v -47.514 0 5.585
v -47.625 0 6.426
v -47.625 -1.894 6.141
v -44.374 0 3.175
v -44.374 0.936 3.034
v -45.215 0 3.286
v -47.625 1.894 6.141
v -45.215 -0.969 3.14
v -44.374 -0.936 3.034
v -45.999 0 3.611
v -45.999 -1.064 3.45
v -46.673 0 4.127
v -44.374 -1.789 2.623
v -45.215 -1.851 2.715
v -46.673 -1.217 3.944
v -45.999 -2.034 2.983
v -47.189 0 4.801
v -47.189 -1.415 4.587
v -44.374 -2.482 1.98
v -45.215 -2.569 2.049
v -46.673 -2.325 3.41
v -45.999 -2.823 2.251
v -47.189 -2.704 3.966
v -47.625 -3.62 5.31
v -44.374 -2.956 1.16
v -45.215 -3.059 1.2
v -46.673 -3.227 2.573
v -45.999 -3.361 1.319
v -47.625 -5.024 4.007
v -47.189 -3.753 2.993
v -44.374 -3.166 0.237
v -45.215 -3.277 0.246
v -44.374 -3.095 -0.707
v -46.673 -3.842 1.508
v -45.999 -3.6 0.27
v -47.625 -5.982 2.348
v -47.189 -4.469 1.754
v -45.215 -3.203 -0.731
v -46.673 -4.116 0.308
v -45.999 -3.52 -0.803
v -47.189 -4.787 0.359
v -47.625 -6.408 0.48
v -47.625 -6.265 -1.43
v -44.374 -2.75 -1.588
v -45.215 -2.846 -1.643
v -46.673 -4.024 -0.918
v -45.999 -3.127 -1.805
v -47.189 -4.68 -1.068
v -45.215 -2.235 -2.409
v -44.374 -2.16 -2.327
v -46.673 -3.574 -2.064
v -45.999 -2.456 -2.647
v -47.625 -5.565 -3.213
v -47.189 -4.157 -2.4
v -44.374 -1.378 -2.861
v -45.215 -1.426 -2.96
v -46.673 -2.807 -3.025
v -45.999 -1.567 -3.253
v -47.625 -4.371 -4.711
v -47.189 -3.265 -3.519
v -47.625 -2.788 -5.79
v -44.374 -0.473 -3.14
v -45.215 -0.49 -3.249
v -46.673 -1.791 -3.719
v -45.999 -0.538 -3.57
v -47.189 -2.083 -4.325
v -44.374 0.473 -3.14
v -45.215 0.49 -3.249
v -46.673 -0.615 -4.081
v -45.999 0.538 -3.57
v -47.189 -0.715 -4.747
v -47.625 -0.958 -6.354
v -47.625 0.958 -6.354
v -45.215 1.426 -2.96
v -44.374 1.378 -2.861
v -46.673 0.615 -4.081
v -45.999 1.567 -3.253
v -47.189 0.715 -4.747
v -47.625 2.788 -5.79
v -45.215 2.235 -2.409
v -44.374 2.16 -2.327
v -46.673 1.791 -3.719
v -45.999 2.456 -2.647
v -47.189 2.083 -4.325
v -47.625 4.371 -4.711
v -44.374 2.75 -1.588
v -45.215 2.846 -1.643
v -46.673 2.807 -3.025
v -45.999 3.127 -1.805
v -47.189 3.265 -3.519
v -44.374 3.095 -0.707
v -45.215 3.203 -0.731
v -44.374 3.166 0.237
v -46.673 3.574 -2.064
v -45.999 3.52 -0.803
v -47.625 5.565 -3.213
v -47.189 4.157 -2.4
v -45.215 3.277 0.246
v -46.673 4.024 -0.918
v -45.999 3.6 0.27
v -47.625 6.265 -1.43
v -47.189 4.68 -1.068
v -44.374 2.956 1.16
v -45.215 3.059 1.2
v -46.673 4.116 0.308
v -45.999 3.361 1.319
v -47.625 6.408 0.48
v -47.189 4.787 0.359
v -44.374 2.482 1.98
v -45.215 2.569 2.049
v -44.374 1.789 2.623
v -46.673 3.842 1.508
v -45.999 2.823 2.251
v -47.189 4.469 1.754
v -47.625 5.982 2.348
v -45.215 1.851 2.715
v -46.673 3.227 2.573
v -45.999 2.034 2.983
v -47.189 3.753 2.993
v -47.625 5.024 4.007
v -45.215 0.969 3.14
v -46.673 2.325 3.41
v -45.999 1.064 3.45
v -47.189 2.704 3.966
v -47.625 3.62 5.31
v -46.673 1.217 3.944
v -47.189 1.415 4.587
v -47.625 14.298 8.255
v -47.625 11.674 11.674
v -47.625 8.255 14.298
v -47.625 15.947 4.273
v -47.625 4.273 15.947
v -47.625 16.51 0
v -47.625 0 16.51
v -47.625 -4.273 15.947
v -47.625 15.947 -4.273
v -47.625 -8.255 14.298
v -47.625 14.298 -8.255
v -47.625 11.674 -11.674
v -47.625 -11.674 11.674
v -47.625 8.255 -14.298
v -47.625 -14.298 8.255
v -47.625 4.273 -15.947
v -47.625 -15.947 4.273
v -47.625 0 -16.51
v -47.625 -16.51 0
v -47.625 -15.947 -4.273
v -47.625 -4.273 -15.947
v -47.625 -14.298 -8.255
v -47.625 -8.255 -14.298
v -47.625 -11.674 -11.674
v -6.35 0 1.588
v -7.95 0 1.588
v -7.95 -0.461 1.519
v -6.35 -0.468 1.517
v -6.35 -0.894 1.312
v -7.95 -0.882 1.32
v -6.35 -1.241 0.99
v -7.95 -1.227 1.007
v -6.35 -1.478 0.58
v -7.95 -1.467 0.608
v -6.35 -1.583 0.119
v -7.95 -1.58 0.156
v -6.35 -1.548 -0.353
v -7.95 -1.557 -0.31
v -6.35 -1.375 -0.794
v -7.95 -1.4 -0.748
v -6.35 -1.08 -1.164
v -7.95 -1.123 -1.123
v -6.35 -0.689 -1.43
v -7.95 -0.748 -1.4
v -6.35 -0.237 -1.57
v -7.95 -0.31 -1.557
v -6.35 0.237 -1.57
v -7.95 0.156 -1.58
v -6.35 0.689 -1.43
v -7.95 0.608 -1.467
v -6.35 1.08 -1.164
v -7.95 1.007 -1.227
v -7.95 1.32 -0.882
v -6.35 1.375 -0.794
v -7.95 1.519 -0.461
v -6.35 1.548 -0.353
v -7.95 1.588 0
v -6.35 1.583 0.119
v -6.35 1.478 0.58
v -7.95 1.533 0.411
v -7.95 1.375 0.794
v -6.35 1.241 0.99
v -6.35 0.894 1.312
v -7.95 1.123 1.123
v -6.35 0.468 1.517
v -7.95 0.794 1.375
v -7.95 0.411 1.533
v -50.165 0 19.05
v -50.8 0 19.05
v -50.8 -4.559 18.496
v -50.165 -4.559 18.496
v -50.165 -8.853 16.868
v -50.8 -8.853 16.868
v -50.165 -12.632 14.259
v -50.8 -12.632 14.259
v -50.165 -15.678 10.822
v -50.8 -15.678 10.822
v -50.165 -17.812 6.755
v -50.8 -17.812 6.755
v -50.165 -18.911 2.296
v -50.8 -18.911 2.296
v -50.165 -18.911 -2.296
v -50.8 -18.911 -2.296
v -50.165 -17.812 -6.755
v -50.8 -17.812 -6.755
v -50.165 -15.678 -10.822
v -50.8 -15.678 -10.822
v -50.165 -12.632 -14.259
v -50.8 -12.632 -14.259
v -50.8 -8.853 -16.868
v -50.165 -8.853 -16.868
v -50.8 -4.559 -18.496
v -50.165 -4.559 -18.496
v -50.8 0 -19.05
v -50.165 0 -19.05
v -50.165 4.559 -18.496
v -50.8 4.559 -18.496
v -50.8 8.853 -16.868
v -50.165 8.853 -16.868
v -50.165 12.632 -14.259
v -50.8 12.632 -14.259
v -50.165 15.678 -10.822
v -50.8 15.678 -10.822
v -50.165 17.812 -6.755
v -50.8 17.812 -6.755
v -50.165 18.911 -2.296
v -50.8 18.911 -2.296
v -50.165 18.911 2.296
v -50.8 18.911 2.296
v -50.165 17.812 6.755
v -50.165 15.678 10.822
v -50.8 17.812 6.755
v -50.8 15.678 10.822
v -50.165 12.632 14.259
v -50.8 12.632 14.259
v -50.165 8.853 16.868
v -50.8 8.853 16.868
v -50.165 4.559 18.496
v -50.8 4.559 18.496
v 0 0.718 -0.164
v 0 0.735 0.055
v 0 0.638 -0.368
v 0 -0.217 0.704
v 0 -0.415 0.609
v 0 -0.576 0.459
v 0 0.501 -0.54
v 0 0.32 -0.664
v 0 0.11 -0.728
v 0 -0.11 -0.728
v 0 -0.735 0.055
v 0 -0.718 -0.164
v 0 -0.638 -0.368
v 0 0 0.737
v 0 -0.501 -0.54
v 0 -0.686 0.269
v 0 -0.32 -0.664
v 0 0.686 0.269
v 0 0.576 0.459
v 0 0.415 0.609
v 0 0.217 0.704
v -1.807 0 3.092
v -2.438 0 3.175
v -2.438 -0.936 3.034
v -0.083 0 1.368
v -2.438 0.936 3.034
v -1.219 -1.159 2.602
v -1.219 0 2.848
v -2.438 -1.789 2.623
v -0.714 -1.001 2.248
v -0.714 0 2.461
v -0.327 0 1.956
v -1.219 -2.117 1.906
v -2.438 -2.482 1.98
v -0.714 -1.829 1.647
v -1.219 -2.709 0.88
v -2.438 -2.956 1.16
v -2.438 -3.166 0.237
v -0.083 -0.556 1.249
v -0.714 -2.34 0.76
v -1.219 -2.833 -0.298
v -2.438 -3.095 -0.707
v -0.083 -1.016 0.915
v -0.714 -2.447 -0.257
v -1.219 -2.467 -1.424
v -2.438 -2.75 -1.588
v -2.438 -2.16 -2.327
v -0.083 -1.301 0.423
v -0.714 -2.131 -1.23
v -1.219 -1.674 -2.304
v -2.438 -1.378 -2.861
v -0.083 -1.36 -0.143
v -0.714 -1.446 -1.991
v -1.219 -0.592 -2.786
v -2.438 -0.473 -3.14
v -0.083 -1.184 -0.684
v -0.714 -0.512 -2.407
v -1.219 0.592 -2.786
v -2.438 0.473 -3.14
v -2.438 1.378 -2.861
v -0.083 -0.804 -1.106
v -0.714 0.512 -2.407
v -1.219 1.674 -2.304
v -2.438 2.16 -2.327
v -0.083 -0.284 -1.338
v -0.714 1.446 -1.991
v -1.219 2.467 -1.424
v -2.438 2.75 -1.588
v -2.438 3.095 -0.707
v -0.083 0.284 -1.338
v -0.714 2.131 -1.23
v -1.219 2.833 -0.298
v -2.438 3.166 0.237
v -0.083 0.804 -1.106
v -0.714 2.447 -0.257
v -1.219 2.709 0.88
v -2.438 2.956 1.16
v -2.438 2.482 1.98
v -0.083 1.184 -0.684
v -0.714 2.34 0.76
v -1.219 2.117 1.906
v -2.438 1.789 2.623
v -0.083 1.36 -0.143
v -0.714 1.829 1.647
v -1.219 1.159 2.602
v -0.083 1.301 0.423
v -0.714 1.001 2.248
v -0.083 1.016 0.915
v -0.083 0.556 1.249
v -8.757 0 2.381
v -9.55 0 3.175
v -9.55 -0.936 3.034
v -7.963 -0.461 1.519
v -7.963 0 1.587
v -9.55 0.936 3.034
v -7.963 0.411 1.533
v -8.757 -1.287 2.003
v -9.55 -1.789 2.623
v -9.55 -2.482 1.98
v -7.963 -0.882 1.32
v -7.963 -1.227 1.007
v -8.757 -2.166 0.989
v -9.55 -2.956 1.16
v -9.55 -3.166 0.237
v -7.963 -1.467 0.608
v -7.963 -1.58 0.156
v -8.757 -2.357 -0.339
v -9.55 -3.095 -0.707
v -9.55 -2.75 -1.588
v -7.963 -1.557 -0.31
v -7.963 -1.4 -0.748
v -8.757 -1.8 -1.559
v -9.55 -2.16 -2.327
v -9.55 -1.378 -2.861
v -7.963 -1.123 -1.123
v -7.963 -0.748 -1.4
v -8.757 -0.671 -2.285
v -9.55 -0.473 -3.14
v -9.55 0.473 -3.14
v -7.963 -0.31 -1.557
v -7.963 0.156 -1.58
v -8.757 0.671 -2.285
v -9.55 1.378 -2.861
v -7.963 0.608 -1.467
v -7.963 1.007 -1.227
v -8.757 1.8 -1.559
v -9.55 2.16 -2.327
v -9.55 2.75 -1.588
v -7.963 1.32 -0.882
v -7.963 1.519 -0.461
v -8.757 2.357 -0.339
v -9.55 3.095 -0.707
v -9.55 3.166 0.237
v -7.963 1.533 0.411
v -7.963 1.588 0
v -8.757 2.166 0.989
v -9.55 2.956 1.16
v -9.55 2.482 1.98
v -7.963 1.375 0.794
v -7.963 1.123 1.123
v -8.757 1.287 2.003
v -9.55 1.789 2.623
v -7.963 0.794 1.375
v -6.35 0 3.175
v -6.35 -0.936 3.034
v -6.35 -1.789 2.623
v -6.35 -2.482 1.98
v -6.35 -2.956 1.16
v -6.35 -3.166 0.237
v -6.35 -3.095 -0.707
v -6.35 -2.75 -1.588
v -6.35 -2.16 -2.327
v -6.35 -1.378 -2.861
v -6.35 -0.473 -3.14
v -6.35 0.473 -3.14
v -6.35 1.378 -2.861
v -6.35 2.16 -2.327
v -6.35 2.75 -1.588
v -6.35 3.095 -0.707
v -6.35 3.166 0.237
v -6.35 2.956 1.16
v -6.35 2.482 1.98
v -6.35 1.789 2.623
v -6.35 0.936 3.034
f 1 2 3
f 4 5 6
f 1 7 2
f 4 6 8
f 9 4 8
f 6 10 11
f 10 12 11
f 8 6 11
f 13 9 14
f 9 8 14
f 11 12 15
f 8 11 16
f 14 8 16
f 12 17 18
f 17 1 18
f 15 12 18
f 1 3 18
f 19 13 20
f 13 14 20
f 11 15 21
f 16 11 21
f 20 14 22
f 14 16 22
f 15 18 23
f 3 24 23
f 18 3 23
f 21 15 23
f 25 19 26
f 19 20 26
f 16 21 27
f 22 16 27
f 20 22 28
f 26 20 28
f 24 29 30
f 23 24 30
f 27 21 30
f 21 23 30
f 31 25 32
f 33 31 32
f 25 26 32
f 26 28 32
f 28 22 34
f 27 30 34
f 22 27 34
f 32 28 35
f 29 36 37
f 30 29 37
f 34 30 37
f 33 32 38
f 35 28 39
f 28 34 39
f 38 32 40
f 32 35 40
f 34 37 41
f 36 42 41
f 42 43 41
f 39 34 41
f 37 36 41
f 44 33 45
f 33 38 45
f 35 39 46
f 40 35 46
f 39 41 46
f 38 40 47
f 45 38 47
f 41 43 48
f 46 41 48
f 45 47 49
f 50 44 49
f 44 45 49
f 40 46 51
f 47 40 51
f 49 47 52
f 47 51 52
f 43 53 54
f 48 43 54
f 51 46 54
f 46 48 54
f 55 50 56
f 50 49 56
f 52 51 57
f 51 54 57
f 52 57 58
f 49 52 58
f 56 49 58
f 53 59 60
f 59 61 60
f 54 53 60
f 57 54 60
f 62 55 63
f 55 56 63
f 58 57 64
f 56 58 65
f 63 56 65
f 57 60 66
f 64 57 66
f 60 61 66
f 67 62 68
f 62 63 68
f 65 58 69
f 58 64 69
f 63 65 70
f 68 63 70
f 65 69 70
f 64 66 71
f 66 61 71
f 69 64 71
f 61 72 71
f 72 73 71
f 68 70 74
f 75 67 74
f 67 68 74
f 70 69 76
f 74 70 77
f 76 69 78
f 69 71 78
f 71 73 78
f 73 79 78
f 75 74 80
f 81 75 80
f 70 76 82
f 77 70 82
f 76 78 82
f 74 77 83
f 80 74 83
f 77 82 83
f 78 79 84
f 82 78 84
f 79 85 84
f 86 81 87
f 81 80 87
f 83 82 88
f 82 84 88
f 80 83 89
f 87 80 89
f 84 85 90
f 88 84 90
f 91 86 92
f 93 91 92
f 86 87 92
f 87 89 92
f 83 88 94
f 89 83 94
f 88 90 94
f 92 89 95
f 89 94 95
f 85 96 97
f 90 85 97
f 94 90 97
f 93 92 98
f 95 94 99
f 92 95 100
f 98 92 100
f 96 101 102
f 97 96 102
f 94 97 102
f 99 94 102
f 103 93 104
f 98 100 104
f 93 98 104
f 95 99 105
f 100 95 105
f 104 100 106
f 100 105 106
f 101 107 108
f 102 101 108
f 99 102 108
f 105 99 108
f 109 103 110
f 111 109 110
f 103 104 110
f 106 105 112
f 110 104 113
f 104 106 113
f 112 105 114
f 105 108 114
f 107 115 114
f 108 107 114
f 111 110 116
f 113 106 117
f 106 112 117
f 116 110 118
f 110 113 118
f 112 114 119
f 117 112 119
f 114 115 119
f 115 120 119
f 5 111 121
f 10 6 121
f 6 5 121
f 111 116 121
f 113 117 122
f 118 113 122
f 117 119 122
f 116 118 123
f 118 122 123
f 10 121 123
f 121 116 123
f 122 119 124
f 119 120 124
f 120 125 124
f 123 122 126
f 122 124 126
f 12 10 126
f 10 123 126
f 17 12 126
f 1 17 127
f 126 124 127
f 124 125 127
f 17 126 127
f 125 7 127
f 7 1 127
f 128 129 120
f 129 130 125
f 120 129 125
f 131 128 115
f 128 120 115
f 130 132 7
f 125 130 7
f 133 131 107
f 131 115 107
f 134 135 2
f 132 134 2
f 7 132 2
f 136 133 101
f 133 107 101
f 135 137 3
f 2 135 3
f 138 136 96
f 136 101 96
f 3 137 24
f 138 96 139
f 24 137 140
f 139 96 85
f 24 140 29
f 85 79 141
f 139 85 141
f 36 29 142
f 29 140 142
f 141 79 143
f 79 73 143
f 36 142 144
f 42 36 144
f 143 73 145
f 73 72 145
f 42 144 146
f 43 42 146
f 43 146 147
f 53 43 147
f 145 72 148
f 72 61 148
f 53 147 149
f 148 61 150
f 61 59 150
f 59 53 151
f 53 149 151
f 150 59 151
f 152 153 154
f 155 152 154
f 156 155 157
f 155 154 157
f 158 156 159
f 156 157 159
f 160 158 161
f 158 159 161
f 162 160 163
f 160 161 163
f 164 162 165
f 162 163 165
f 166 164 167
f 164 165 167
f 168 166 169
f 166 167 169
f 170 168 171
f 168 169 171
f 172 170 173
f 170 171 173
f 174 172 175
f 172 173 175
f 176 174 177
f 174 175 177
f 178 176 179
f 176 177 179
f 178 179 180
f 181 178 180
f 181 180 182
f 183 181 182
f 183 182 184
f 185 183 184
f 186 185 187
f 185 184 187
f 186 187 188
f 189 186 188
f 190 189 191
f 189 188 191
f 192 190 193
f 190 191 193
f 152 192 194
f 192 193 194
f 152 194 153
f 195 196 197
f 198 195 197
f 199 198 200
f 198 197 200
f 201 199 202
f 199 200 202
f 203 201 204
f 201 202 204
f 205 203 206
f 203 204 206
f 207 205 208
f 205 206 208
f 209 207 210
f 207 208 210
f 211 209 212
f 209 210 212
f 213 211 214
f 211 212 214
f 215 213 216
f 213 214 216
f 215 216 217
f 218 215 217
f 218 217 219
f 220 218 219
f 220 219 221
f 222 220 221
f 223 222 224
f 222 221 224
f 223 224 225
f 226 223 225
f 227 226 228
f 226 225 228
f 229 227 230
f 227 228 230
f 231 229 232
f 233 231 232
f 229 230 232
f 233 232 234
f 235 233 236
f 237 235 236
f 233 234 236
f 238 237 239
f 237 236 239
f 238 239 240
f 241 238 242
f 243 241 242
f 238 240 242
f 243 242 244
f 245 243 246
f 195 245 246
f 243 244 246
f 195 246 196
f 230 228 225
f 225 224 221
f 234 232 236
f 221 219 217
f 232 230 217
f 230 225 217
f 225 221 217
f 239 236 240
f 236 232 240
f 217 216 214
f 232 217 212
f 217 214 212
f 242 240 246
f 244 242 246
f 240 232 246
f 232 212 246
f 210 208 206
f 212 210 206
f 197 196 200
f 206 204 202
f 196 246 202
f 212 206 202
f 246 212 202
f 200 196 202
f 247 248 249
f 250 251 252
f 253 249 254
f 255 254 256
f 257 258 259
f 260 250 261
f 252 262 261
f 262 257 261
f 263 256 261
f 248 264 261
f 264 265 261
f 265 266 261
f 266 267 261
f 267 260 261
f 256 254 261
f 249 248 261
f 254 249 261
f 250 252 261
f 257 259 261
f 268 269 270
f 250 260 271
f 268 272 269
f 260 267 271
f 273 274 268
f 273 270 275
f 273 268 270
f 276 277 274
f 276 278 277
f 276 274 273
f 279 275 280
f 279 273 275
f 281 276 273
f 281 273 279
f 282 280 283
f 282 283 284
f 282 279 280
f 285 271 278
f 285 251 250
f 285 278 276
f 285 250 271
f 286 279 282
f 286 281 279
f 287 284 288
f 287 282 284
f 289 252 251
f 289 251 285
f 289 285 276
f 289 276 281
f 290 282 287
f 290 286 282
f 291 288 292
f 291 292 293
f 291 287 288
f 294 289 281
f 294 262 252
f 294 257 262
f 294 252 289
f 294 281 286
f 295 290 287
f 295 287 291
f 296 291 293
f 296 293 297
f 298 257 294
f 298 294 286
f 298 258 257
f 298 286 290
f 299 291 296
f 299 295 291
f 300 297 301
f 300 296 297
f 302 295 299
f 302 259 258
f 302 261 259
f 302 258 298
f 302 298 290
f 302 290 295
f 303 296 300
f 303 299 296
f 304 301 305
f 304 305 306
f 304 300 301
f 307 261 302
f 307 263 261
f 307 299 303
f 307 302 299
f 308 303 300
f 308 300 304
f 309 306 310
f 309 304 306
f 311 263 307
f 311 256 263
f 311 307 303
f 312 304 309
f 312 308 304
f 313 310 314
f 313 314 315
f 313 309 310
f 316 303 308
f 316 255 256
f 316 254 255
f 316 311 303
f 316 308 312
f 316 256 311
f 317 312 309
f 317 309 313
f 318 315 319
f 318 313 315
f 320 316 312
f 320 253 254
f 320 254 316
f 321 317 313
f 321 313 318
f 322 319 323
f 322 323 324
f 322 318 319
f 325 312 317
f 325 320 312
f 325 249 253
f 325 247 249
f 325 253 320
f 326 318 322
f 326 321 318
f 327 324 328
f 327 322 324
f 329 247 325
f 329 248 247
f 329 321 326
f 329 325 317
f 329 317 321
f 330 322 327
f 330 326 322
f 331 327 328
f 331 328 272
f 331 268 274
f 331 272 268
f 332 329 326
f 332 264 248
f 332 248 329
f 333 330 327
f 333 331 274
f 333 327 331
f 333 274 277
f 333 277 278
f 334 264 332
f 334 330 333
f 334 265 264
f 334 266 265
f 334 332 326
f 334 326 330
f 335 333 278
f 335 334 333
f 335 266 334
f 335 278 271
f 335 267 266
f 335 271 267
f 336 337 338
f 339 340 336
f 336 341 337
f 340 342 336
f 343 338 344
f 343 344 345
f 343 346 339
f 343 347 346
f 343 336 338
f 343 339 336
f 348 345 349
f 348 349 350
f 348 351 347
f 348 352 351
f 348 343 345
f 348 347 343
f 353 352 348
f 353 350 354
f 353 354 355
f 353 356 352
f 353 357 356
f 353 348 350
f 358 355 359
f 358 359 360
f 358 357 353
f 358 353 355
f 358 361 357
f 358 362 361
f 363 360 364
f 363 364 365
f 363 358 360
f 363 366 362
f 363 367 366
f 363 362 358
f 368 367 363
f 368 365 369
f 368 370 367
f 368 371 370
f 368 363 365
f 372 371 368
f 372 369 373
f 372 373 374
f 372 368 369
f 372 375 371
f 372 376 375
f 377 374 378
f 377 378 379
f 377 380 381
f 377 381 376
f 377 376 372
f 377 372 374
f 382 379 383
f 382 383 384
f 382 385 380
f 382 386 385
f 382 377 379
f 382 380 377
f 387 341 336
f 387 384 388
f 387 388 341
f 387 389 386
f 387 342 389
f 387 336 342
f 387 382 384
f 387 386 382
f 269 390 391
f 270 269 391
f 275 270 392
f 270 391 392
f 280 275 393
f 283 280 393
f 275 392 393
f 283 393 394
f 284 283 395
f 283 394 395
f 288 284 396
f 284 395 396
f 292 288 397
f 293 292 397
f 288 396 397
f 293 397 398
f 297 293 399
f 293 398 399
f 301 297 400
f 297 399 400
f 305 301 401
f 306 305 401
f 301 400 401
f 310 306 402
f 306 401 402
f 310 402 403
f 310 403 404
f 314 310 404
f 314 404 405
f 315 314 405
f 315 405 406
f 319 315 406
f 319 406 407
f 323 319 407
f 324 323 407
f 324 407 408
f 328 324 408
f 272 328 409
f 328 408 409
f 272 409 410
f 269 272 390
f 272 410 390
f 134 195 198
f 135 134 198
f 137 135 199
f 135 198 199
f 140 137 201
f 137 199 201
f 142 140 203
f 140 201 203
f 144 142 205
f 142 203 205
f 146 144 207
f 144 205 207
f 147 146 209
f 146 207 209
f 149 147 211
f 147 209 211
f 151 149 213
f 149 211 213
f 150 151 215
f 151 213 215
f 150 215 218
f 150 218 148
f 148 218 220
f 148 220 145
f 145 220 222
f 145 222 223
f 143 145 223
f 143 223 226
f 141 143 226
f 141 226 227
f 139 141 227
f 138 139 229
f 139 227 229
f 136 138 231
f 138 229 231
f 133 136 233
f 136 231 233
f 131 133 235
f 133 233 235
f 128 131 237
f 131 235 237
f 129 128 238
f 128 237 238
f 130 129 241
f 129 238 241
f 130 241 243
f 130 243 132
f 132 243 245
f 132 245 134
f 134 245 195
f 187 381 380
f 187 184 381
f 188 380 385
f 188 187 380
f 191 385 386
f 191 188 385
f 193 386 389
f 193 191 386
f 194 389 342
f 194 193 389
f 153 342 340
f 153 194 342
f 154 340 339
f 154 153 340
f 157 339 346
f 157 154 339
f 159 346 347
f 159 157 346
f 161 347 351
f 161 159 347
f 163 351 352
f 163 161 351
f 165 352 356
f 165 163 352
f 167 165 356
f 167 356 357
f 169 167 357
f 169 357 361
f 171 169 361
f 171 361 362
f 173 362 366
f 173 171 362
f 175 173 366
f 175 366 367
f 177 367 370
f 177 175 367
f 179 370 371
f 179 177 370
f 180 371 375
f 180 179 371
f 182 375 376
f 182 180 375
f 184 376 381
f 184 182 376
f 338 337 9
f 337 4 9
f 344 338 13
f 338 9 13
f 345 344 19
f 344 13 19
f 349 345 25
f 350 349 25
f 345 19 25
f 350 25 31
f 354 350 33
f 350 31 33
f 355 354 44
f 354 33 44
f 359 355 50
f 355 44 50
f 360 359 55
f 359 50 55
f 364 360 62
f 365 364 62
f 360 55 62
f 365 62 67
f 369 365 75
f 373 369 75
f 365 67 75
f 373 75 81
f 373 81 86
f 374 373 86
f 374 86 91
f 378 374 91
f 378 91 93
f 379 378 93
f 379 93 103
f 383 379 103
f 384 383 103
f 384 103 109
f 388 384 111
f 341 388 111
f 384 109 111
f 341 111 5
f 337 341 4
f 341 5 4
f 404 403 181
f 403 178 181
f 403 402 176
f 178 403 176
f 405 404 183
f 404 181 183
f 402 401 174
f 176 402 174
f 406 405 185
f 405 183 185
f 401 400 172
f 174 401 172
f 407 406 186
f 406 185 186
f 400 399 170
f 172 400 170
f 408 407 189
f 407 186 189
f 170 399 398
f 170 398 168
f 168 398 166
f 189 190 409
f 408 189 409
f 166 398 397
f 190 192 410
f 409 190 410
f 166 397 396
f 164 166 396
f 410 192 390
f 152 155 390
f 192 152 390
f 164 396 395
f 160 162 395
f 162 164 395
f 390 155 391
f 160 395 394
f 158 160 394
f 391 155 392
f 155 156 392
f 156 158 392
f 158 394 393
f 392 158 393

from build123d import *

# Parameters (mm, degrees)
F2_R        = 3.2512
F3_SIZE2    = 2.54
F3_SIZE     = 2.54
F4_S5_R     = 1.5875
F4_T6_DEPTH = 6
F5_R        = 2.4384


# Not quite as in the source:
# - a fillet or chamfer that OpenCascade refuses, or shapes differently, is made with other operations: its cross-section is extruded or revolved along the edge and cut away or added


with BuildPart() as f1:
    # F0 (on Front) → F1 (revolve)
    with BuildSketch(Plane.XZ):
        Polygon((-50.8, 0), (0, 0), (0, 3.175), (-6.35, 3.175), (-6.35, 1.5875), (-7.9502, 1.5875), (-7.9502, 3.175), (-47.625, 3.175), (-47.625, 19.05), (-50.8, 19.05), align=None)
    revolve(axis=Axis((-25.4, 0, 0), (1, 0, 0)))

    # F2
    f2_edges = [f1.edges().sort_by_distance(p)[0] for p in [
        (-47.625, 0, -3.175),
    ]]
    fillet(f2_edges, radius=F2_R)

    # F3
    f3_edges = [f1.edges().sort_by_distance(p)[0] for p in [
        (-47.625, 0, -6.4262),
        (-47.625, 0, -19.05),
    ]]
    chamfer(f3_edges, length=F3_SIZE, length2=F3_SIZE2)

    # F4: chamfer of 1.6002 on 1 edges, made by hand


with BuildPart() as f4_tool2:
    # F4_s3 → F4_t4 (revolve)
    with BuildSketch(Plane.XZ):
        Polygon((-9.5504, 3.175), (-7.9502, 1.5748), (-7.9502, 3.175), align=None)
    revolve(axis=Axis((-7.9502, 0, 0), (1, 0, 0)))

    # F4_s5 → F4_t6 (cut, symmetric)
    with BuildSketch(Plane.YZ.offset(-8.8)):
        Circle(F4_S5_R)
    extrude(amount=F4_T6_DEPTH, both=True, mode=Mode.SUBTRACT)


with BuildPart() as f1_1:
    add(f1.part)

    # F4_t1: cut F4_tool2
    add(f4_tool2.part, mode=Mode.SUBTRACT)

    # F5
    f5_edges = [f1_1.edges().sort_by_distance(p)[0] for p in [
        (0, 0, -3.175),
    ]]
    fillet(f5_edges, radius=F5_R)


solid = f1_1.part
